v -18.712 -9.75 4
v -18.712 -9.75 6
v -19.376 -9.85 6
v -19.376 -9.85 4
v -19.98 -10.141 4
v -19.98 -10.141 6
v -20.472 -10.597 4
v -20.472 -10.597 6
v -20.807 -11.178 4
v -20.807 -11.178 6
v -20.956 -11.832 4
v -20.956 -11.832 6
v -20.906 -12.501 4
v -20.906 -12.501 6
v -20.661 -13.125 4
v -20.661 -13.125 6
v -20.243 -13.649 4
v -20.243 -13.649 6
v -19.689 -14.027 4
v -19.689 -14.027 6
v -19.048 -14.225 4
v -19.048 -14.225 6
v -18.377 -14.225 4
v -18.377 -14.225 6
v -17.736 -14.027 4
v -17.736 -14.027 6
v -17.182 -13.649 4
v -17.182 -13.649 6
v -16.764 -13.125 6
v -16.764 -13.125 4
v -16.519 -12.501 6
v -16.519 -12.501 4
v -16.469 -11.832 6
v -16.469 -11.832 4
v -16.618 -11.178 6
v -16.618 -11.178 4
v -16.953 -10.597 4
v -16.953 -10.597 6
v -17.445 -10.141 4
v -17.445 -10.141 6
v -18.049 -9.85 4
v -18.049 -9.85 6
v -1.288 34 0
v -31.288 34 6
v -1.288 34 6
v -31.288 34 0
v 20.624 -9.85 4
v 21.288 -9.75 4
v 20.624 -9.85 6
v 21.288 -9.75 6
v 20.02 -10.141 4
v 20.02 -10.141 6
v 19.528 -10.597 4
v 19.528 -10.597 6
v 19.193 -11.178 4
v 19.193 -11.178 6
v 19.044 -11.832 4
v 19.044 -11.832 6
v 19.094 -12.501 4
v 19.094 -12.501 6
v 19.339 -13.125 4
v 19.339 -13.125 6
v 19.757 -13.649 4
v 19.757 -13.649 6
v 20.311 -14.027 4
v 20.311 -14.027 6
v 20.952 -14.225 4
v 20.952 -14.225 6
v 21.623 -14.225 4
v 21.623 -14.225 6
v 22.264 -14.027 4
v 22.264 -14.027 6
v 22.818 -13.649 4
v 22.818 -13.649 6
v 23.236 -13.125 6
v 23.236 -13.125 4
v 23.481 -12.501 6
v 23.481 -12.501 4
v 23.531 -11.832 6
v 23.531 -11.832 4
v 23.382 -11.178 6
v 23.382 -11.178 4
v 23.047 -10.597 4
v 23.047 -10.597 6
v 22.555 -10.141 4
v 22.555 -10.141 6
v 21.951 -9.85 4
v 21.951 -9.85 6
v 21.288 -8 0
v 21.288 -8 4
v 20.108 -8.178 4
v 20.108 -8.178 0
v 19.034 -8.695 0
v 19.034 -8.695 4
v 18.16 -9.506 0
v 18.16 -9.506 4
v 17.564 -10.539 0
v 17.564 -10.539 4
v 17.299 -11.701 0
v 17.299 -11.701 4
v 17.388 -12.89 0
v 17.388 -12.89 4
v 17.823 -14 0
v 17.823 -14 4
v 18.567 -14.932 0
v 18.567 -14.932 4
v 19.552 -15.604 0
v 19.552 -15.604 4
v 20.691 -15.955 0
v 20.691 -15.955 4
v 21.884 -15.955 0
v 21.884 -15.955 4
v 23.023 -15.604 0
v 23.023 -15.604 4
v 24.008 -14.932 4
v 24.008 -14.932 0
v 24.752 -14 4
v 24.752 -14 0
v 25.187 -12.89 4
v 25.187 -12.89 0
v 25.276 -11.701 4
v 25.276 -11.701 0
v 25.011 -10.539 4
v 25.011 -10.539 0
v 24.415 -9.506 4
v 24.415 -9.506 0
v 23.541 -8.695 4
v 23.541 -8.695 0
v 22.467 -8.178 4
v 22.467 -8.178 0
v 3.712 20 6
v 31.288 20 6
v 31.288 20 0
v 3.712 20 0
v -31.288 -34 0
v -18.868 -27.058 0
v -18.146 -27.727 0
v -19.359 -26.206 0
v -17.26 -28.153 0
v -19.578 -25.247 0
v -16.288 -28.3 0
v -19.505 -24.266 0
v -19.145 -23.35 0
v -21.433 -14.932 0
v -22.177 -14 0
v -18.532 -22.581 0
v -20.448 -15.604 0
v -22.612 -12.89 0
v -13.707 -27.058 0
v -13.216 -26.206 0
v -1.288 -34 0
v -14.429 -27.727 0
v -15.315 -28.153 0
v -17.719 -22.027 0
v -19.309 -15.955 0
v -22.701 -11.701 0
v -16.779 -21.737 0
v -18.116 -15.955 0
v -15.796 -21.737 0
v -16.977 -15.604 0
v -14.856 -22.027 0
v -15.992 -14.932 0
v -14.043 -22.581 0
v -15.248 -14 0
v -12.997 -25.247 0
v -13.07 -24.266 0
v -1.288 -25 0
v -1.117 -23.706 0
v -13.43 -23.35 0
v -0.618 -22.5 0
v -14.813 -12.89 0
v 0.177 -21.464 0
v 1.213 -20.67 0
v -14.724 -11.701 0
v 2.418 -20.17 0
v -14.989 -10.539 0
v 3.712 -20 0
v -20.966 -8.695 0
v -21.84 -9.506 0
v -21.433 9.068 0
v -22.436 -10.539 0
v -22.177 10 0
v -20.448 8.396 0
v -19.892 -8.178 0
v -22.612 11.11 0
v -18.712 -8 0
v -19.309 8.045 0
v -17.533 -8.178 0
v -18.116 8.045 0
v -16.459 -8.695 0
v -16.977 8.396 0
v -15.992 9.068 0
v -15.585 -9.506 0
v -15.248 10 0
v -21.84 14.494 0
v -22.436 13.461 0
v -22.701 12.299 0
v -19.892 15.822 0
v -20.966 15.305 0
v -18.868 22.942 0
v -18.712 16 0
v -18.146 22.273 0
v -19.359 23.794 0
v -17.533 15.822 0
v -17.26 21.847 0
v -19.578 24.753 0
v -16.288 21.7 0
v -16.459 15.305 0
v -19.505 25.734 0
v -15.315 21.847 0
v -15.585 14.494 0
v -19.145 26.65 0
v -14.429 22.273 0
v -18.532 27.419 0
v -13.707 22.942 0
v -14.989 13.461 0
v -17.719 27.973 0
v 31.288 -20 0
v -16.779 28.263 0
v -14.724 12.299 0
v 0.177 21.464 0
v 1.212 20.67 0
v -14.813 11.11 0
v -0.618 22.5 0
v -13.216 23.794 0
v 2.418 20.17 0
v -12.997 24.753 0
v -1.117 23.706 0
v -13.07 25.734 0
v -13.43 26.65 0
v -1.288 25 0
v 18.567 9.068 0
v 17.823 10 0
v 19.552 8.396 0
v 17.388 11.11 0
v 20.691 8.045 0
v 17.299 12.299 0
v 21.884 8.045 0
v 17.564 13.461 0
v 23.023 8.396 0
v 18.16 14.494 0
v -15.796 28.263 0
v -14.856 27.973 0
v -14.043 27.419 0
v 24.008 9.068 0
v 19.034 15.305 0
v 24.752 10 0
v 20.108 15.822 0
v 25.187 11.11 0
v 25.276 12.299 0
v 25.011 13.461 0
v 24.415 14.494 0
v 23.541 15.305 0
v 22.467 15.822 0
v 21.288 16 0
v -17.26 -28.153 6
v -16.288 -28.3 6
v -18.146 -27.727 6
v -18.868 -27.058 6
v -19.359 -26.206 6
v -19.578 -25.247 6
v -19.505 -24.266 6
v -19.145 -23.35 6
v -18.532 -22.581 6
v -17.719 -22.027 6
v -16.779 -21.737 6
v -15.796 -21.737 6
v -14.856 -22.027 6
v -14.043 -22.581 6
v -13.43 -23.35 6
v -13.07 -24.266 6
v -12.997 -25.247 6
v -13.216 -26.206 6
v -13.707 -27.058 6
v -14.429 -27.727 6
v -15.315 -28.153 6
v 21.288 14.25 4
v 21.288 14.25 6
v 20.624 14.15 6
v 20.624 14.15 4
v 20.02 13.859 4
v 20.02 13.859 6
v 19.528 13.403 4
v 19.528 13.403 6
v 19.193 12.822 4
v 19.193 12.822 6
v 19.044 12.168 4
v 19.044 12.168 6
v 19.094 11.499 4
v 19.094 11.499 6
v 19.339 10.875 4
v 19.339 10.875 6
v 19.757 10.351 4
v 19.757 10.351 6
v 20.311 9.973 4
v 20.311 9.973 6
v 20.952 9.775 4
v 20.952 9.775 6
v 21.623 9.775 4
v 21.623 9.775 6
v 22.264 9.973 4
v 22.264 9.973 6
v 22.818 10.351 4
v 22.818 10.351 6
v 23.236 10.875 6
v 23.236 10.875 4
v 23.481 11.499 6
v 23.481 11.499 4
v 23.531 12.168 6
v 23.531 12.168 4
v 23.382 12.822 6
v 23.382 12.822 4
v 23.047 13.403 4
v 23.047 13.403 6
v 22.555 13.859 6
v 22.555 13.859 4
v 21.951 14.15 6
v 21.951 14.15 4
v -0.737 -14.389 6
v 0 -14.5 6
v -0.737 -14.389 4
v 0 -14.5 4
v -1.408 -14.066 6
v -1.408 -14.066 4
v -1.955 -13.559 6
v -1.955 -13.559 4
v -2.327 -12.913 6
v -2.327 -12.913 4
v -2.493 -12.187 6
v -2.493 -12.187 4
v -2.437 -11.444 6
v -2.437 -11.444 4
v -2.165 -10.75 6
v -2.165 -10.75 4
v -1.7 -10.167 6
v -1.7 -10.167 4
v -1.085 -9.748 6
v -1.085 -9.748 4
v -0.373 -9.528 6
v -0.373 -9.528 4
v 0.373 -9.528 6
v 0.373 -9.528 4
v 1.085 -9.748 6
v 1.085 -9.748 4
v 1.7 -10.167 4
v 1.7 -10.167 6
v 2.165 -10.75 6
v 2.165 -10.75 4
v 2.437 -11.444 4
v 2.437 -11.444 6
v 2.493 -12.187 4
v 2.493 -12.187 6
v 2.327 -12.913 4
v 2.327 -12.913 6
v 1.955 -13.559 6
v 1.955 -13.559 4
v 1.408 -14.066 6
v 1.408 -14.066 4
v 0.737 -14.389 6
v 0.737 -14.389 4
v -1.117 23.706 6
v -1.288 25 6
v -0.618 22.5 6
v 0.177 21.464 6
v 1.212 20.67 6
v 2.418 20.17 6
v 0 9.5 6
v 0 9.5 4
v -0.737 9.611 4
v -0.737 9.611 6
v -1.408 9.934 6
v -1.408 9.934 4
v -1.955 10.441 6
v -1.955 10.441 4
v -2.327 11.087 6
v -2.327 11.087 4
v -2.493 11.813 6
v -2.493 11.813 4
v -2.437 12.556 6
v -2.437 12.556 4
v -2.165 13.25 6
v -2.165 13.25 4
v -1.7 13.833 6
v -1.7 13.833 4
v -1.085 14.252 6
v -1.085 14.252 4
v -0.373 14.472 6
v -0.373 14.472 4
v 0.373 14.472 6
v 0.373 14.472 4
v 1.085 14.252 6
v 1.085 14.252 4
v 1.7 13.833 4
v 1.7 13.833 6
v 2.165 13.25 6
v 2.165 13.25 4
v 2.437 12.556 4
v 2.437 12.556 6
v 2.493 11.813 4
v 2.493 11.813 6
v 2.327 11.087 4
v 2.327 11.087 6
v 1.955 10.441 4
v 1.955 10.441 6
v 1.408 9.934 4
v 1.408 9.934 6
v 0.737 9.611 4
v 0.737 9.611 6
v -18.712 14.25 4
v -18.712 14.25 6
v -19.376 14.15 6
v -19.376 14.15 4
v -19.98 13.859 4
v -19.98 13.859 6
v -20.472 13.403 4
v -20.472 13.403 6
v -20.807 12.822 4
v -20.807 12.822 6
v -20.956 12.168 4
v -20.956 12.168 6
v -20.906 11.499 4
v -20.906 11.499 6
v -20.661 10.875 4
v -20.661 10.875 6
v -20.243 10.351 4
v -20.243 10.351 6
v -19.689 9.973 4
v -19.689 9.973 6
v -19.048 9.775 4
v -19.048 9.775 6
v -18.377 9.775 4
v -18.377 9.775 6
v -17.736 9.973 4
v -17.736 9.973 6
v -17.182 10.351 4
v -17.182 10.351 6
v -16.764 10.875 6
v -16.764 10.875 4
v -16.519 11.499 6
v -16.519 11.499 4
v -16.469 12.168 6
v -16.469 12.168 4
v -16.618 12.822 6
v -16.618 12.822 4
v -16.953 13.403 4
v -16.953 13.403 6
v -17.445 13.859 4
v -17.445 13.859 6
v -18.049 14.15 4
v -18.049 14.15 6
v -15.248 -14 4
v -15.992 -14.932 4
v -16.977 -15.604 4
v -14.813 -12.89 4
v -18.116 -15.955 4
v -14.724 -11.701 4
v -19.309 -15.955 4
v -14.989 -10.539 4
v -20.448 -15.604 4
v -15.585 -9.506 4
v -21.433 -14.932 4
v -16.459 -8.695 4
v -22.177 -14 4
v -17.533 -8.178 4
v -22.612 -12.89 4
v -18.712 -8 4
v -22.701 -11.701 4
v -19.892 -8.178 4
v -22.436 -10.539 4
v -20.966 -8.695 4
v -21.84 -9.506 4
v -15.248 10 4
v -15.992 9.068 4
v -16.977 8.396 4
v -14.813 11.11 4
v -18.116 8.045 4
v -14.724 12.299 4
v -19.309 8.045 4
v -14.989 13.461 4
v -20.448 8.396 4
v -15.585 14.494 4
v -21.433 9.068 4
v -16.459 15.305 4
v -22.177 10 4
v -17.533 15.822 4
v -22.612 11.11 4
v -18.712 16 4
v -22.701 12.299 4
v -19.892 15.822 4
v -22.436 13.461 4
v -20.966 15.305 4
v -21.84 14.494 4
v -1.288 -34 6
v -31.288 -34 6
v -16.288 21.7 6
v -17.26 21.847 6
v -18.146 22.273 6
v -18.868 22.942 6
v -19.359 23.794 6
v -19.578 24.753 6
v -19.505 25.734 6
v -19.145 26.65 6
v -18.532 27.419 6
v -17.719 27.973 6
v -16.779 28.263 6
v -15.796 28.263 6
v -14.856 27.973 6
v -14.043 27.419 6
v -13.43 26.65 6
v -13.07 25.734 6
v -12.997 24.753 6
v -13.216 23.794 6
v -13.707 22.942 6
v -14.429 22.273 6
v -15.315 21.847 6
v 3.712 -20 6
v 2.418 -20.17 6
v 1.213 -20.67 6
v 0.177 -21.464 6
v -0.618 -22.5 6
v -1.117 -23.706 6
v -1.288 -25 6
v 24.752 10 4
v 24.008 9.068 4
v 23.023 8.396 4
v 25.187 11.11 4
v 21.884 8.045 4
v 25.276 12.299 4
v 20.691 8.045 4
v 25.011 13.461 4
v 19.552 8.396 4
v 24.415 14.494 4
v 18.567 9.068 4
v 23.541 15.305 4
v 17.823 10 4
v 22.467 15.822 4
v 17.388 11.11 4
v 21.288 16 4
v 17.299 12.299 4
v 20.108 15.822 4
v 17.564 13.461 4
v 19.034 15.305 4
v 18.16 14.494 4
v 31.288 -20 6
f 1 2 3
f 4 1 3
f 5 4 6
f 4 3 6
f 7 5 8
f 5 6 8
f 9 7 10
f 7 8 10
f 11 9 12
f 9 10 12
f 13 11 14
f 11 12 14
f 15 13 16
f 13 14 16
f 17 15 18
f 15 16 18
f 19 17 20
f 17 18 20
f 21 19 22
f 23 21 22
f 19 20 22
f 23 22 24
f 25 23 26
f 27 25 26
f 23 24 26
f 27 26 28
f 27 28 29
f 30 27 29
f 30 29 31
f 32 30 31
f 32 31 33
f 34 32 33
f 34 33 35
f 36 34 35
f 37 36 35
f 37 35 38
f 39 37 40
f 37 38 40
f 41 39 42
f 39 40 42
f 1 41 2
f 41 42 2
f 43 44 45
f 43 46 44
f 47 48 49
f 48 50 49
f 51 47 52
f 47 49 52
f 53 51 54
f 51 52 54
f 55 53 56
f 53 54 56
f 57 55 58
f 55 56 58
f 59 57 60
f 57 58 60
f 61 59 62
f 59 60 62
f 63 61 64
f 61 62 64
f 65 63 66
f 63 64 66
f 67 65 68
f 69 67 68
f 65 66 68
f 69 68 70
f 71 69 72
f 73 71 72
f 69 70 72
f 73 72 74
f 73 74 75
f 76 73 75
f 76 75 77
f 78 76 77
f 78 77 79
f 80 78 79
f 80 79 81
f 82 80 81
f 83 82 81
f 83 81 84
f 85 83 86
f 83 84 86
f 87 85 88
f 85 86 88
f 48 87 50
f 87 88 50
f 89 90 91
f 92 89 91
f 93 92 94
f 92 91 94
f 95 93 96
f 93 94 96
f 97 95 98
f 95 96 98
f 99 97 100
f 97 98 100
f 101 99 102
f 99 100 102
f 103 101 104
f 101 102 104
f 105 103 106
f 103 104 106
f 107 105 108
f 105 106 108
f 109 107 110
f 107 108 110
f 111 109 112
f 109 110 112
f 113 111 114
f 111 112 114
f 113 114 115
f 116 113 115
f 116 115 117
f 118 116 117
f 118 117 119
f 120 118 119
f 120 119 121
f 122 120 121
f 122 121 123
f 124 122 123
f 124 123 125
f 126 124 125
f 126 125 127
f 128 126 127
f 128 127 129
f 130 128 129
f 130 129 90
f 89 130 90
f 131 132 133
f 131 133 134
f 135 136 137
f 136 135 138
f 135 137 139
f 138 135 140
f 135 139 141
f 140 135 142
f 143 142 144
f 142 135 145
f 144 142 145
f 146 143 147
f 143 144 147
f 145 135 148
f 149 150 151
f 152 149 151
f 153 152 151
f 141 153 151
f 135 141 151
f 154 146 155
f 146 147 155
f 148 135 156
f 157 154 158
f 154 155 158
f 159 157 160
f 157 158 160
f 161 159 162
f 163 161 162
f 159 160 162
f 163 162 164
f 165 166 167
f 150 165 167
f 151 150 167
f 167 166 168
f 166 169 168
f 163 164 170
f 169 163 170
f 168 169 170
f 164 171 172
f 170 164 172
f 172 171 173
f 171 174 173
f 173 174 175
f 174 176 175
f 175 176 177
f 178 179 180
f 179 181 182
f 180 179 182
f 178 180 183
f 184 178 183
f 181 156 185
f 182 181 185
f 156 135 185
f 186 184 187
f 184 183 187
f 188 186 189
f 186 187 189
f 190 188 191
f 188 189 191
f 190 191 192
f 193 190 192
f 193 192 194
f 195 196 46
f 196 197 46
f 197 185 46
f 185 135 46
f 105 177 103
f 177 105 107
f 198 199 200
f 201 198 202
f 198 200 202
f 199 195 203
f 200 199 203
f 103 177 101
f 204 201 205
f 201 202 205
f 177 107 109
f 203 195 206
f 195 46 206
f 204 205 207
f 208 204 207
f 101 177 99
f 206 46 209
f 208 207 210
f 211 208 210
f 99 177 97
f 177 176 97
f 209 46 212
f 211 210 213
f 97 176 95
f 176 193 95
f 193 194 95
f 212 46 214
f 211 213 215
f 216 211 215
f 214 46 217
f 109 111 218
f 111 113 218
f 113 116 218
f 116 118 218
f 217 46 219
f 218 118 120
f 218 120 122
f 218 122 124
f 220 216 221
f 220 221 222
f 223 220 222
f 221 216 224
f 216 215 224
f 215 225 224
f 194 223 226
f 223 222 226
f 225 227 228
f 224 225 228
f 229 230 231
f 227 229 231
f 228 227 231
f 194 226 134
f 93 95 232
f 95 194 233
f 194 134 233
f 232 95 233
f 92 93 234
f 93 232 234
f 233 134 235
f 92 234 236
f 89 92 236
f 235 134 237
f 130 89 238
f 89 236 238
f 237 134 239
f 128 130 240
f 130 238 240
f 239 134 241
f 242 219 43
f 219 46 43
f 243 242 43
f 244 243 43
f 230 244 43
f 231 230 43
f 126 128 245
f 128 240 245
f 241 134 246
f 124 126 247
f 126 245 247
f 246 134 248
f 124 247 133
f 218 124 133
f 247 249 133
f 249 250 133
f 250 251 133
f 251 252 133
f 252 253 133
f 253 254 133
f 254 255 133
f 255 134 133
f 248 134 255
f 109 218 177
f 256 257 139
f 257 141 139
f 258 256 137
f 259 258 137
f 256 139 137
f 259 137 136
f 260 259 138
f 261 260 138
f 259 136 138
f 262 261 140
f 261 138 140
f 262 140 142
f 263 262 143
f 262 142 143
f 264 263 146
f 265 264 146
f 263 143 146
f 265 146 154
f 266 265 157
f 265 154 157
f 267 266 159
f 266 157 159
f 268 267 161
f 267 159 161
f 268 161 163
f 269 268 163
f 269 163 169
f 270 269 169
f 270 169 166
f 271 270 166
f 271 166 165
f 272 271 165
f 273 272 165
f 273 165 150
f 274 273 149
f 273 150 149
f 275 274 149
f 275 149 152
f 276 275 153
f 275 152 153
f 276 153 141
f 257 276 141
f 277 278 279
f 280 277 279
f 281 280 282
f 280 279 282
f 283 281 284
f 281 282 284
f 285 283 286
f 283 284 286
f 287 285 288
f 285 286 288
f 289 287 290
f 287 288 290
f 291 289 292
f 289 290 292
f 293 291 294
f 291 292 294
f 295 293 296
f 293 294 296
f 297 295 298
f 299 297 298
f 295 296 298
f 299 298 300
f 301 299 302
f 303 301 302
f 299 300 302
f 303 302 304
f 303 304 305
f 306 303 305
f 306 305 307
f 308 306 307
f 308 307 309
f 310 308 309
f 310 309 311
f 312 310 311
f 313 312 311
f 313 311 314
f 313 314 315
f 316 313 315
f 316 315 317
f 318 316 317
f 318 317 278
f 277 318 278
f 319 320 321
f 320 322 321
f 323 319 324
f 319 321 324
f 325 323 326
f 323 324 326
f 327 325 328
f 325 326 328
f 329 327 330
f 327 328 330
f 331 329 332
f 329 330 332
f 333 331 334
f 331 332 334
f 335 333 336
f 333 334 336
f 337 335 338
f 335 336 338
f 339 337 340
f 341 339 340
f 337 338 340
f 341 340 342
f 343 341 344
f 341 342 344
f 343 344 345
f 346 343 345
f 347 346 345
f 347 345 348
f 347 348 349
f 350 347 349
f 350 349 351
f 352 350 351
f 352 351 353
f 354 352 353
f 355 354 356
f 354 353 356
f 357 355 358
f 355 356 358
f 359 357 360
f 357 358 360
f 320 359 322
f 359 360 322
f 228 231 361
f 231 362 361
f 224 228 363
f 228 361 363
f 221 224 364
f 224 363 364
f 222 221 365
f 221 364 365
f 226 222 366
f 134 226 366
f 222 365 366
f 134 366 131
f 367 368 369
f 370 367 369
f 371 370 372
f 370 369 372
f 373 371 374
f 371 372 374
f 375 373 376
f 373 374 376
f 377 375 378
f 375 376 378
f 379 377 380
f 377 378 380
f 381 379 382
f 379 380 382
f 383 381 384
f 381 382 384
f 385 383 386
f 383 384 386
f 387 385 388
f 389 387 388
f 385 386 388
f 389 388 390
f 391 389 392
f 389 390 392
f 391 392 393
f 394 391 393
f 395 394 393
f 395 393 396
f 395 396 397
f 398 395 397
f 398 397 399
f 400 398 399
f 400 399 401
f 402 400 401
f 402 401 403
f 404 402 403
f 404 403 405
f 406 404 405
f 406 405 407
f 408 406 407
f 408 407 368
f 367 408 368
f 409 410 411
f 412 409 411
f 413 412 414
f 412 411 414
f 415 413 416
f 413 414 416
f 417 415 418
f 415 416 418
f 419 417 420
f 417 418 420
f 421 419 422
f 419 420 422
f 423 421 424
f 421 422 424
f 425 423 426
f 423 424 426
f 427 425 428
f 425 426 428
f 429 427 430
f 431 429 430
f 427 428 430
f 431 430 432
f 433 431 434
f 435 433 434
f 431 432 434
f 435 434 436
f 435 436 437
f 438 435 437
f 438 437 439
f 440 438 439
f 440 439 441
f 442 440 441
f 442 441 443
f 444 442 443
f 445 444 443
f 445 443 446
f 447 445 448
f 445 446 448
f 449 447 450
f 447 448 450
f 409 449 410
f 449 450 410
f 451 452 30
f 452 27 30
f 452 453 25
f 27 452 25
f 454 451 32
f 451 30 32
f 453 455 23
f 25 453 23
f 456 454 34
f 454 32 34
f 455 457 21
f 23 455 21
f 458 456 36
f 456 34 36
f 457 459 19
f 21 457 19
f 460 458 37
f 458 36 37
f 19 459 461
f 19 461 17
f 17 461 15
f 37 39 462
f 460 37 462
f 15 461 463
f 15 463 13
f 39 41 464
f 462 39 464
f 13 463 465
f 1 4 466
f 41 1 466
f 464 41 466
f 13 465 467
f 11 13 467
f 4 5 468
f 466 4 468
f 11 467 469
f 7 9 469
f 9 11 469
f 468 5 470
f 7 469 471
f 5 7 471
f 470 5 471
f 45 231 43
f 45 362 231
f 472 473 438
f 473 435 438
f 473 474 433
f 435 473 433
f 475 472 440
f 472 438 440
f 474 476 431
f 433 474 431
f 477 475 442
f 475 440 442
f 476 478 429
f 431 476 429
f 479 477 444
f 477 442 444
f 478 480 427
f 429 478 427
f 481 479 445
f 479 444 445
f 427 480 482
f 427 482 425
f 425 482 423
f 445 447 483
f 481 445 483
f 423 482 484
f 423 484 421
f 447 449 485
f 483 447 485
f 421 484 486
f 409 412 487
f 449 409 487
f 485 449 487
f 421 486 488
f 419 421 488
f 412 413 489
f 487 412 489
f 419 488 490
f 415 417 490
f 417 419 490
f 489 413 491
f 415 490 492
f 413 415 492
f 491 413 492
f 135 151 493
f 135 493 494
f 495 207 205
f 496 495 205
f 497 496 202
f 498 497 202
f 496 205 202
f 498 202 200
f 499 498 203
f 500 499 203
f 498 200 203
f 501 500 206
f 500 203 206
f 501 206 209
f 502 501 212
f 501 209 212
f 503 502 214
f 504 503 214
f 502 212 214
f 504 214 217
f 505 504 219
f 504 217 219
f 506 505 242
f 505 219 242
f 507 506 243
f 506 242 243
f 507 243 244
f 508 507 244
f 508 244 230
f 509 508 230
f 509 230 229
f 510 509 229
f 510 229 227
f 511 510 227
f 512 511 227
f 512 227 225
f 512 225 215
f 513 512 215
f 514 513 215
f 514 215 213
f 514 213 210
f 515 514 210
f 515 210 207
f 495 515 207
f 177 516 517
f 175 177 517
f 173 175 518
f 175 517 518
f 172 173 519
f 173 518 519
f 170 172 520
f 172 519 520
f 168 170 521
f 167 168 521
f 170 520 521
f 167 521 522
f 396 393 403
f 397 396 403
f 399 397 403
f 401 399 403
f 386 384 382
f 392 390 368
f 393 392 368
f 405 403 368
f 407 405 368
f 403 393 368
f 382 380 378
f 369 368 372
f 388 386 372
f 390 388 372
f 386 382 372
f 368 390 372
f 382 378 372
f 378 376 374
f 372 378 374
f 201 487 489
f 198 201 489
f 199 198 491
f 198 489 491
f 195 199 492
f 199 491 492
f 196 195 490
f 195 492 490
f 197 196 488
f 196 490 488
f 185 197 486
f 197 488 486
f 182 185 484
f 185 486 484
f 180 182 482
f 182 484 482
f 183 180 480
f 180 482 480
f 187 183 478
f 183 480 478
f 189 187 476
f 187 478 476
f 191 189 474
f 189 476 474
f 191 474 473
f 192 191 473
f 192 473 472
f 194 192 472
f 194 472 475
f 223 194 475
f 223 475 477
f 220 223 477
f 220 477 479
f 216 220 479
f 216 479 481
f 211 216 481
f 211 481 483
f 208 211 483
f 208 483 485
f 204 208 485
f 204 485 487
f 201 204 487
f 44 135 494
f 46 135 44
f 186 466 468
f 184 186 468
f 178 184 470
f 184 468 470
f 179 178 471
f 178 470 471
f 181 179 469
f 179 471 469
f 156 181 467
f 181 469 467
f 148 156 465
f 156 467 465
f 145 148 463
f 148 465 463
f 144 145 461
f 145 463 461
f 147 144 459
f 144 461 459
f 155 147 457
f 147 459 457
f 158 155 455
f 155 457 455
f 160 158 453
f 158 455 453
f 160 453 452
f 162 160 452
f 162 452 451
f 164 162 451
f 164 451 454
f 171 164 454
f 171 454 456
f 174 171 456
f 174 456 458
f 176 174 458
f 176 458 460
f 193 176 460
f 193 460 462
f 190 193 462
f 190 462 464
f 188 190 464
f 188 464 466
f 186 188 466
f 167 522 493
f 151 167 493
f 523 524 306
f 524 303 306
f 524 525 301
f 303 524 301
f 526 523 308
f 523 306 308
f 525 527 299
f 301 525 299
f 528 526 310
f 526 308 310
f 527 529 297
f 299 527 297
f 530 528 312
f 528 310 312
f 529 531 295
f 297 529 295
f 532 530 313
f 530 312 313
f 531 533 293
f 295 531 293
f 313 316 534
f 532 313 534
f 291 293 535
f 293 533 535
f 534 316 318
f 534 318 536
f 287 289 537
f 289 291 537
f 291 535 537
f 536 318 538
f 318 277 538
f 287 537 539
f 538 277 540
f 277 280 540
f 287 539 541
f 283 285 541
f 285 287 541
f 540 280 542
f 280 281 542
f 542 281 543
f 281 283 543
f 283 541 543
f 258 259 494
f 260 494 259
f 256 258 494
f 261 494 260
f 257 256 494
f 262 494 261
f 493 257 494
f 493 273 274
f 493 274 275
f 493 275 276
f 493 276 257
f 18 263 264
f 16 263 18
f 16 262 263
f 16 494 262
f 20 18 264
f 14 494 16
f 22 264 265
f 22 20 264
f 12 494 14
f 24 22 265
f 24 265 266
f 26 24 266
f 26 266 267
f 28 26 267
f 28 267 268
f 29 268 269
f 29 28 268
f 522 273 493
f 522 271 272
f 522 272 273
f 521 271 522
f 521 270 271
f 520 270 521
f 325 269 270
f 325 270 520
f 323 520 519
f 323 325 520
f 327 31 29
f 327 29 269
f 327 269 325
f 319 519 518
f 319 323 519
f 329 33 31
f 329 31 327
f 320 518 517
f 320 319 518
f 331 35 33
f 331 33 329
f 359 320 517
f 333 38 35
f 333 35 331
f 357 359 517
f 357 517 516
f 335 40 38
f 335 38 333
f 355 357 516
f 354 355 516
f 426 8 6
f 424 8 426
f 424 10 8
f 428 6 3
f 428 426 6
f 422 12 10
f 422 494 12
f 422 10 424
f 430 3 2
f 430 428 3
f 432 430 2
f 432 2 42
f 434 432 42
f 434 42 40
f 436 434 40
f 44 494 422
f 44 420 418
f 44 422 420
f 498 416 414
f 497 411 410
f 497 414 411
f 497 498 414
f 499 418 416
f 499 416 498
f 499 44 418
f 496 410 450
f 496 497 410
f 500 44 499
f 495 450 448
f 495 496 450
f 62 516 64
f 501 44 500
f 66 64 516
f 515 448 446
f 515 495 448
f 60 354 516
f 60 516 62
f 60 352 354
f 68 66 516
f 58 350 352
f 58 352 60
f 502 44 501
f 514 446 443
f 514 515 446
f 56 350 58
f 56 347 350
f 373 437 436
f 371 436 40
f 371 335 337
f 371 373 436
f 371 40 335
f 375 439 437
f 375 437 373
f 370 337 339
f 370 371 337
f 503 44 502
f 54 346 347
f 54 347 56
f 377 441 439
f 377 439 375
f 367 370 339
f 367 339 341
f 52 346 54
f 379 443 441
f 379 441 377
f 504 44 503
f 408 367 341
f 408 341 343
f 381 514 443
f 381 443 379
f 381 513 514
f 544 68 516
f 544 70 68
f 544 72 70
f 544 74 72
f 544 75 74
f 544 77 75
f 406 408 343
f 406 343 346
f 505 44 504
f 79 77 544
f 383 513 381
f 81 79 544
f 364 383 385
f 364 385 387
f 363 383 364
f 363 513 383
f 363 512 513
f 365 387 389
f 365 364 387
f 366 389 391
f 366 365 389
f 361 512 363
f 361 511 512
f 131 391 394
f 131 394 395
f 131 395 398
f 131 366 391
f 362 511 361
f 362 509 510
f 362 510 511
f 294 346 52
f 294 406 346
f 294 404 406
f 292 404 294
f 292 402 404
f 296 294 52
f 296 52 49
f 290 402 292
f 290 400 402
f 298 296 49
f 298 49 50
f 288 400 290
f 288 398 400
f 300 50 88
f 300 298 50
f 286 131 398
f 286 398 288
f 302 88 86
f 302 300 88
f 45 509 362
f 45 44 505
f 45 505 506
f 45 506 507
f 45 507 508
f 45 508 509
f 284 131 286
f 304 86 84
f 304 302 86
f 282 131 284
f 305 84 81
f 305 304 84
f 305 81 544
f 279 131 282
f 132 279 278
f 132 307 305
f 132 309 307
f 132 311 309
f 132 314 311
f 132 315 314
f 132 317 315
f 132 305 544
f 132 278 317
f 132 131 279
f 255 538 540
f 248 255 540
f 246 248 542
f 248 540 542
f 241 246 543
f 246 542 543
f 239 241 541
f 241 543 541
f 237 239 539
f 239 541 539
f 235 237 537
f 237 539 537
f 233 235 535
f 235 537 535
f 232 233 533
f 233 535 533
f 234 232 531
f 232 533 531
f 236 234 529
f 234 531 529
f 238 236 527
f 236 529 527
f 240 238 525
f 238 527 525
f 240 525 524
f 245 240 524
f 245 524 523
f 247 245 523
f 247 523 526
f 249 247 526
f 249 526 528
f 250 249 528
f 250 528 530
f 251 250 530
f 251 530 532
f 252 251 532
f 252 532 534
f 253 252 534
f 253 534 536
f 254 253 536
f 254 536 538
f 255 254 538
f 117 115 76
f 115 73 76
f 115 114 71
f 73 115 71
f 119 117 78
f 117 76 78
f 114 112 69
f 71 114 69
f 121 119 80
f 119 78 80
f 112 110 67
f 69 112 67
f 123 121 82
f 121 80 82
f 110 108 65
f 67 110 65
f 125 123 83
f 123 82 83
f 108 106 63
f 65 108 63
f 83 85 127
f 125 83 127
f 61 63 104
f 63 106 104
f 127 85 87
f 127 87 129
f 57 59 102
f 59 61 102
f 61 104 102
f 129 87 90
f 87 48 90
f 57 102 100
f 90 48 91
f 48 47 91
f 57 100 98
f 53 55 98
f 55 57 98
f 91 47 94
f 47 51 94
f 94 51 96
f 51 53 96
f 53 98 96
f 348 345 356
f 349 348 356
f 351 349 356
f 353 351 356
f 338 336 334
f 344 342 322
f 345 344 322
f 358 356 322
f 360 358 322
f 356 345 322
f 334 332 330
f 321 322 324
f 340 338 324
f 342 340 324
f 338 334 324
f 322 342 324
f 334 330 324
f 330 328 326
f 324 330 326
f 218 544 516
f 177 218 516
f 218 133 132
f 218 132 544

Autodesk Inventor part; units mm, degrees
ref_plane "YZ Plane" through (0, 0, 0) normal (1, 0, 0) x (0, 1, 0)
ref_plane "XZ Plane" through (0, 0, 0) normal (0, 1, 0) x (-1, 0, 0)
ref_plane "XY Plane" through (0, 0, 0) normal (0, 0, 1) x (1, 0, 0)
sketch "Skizze1" plane through (0, 0, 0) normal (0, 0, 1) x (1, 0, 0)
  line L0 (-31.2875, 34) -> (31.2875, 34)
  line L1 (31.2875, 34) -> (31.2875, -34)
  line L2 (31.2875, -34) -> (-31.2875, -34)
  line L3 (-31.2875, -34) -> (-31.2875, 34)
  point P0 (0, 0)
  dimension "d0" = 62.575
  dimension "d1" = 68
  dimension "d40" = 31.2875
  dimension "d41" = 34
extrude "Extrusion1" add sketch "Skizze1" along normal blind 6
sketch "Skizze2" plane through (0, 0, 0) normal (0, 0, -1) x (-1, 0, 0)
  line L0 (31.2875, 34) -> (31.2875, -34) projected
  point P0 (18.7125, -12)
  point P1 (-21.2875, -12)
  point P2 (0, 0)
  point P3 (-21.2875, 12)
  point P4 (18.7125, 12)
  point P5 (-21.2875, -12)
  dimension "d9" = 40
  dimension "d10" = 12.575
  dimension "d20" = 24
  dimension "d21" = 12
hole "Bohrung1" at (-18.7125, -12, 0) at (21.2875, -12, 0) at (21.2875, 12, 0) at (-18.7125, 12, 0) direction (0, 0, 1) diameter 4.5 end through all counterbore diameter 8 counterbore depth 4 clearance for "Innensechskantkopfschraube" size "M4" standard "ANSI Metrisches M Profil"
sketch "Skizze3" plane through (0, 0, 6) normal (0, 0, 1) x (1, 0, 0)
  circle A0 centre (21.2875, -12) radius 2.25 projected
  circle A1 centre (-18.7125, -12) radius 2.25 projected
  circle A2 centre (-18.7125, 12) radius 2.25 projected
  circle A3 centre (21.2875, 12) radius 2.25 projected
  point P0 (0, 0)
  point P1 (0, -12)
  point P2 (0, 12)
hole "Bohrung2" at (0, -12, 6) at (0, 12, 6) direction (0, 0, -1) diameter 5 depth 2
sketch "Skizze4" plane through (0, 0, 6) normal (0, 0, 1) x (1, 0, 0)
  line L0 (-31.2875, -34) -> (31.2875, -34) projected
  line L1 (31.2875, 34) -> (-31.2875, 34) projected
  line L2 (-31.2875, 34) -> (-31.2875, -34) projected
  point P0 (0, 0)
  point P1 (-16.2875, -25)
  point P2 (-16.2875, 25)
  dimension "d29" = 9
  dimension "d30" = 9
  dimension "d31" = 15
hole "Bohrung3" at (-16.2875, -25, 6) at (-16.2875, 25, 6) direction (0, 0, -1) diameter 6.6 end through all clearance for "Innensechskantkopfschraube" size "M6" standard "ANSI Metrisches M Profil"
sketch "Skizze5" plane through (0, 0, 6) normal (0, 0, 1) x (1, 0, 0)
  line L0 (-31.2875, -34) -> (31.2875, -34) projected
  line L1 (31.2875, -34) -> (31.2875, 34) projected
  line L2 (-1.2875, -34) -> (31.2875, -34)
  line L3 (31.2875, -34) -> (31.2875, -20)
  line L4 (31.2875, -20) -> (3.7125, -20)
  line L5 (-1.2875, -25) -> (-1.2875, -34)
  line L6 (-1.2875, 34) -> (31.2875, 34)
  line L7 (31.2875, 34) -> (31.2875, 20)
  line L8 (31.2875, 20) -> (3.7125, 20)
  line L9 (-1.2875, 25) -> (-1.2875, 34)
  line L10 (-31.2875, 34) -> (-31.2875, -34) projected
  line L11 (31.2875, 34) -> (-31.2875, 34) projected
  arc A0 (3.7125, -20) -> (-1.2875, -25) centre (3.7125, -25) ccw
  arc A1 (-1.2875, 25) -> (3.7125, 20) centre (3.7125, 25) ccw
  point P0 (0, 0)
  point P1 (-1.2875, -29.5)
  dimension "d42" = 40
  dimension "d43" = 20
  dimension "d44" = 30
  dimension "d45" = 30
  dimension "d46" = 5
extrude "Extrusion2" cut sketch "Skizze5" against normal through all contours L5 A0 L4 L1 L0 | L6 L1 L8 A1 L9
equation "\"d40\" = 0.5 * d0"
equation "\"d41\" = 0.5 * d1"
properties part number "TS_Halterung_Fuehrungszylinder_int"
